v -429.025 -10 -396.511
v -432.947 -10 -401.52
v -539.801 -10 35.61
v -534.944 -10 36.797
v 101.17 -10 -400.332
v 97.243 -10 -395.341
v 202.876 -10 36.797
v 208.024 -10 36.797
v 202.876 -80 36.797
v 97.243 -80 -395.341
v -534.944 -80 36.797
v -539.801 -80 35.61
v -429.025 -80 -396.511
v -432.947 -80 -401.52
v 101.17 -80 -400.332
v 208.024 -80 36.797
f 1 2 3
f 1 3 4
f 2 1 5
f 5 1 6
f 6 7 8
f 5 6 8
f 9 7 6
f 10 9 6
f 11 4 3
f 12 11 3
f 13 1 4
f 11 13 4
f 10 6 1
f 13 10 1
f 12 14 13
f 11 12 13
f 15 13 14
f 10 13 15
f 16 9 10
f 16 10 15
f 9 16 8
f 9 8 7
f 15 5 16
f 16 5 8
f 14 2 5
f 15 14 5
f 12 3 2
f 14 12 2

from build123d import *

# Parameters (mm, degrees)
F0_W     = 540
F0_H     = 390
F1_DEPTH = 10
F3_DEPTH = 70
F4_DEPTH = 25


with BuildPart() as f1:
    # F0 (on Front) → F1 (new body)
    with BuildSketch(Plane.XZ):
        Polygon((-575.5810141563, 243.9473703504), (-465.5810141563, -206.0526296496), (133.660423523, -206.0526296496), (243.660423523, 243.9473703504), (133.660423523, 243.9473703504), (-465.5810141563, 243.9473703504), align=None)
        with Locations((-166.339576477, 18.9473703504)):
            Rectangle(F0_W, F0_H, mode=Mode.SUBTRACT)
        Polygon((-495.5810141563, 43.0153865893), (-537.3643879646, 213.9473703504), (-495.5810141563, 213.9473703504), align=None, mode=Mode.SUBTRACT)
        Polygon((163.660423523, 213.9473703504), (205.4437973313, 213.9473703504), (163.660423523, 43.0153865893), align=None, mode=Mode.SUBTRACT)
    extrude(amount=F1_DEPTH)

    # F4 (cut): a face of the model
    f4_faces = [f1.faces().sort_by_distance(p)[0] for p in [
        (-511.5013869102, -10, 21.1668347883),
    ]]
    extrude(f4_faces, amount=-F4_DEPTH, mode=Mode.SUBTRACT)


with BuildPart() as f3:
    # F2 (on face) → F3 (new body)
    with BuildSketch(Plane.XZ.offset(10)):
        Polygon((-475.5810141563, -206.0526296496), (-534.9442867756, 36.7971219746), (-539.8012818081, 35.6098565222), (-432.9473910934, -401.5196964014), (101.1698054276, -400.332430949), (208.0236961423, 36.7971219746), (203.0236961423, 36.7971219746), (202.8764806659, 36.7971219746), (97.2426813323, -395.3411480265), (-429.0245324018, -396.5109640999), align=None)
    extrude(amount=F3_DEPTH)


solid = f3.part
